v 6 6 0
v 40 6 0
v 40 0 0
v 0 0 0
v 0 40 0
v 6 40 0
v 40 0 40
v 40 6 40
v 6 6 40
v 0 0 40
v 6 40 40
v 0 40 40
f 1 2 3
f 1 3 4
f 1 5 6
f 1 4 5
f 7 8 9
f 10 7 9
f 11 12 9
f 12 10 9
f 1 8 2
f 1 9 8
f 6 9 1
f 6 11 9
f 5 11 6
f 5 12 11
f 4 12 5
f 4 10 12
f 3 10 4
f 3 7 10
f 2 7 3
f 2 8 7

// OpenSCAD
$fn = 32;

// ----------------------------------------------------------------------
// Structural section: angle 40 x 40 mm
// ----------------------------------------------------------------------

// --- parameters (mm) ---
sec_w = 40;               // leg width, X
sec_h = 40;               // leg height, Y
flange_t = 6;             // leg thickness
plate_t = 40;             // cut length, Z (extrusion height)

profile = [[0, 0], [40, 0], [40, 6], [6, 6], [6, 40], [0, 40]];  // primary outline, 6 points, counter clockwise

// --- the one profile operation ---
linear_extrude(height = plate_t) polygon(points = profile);
